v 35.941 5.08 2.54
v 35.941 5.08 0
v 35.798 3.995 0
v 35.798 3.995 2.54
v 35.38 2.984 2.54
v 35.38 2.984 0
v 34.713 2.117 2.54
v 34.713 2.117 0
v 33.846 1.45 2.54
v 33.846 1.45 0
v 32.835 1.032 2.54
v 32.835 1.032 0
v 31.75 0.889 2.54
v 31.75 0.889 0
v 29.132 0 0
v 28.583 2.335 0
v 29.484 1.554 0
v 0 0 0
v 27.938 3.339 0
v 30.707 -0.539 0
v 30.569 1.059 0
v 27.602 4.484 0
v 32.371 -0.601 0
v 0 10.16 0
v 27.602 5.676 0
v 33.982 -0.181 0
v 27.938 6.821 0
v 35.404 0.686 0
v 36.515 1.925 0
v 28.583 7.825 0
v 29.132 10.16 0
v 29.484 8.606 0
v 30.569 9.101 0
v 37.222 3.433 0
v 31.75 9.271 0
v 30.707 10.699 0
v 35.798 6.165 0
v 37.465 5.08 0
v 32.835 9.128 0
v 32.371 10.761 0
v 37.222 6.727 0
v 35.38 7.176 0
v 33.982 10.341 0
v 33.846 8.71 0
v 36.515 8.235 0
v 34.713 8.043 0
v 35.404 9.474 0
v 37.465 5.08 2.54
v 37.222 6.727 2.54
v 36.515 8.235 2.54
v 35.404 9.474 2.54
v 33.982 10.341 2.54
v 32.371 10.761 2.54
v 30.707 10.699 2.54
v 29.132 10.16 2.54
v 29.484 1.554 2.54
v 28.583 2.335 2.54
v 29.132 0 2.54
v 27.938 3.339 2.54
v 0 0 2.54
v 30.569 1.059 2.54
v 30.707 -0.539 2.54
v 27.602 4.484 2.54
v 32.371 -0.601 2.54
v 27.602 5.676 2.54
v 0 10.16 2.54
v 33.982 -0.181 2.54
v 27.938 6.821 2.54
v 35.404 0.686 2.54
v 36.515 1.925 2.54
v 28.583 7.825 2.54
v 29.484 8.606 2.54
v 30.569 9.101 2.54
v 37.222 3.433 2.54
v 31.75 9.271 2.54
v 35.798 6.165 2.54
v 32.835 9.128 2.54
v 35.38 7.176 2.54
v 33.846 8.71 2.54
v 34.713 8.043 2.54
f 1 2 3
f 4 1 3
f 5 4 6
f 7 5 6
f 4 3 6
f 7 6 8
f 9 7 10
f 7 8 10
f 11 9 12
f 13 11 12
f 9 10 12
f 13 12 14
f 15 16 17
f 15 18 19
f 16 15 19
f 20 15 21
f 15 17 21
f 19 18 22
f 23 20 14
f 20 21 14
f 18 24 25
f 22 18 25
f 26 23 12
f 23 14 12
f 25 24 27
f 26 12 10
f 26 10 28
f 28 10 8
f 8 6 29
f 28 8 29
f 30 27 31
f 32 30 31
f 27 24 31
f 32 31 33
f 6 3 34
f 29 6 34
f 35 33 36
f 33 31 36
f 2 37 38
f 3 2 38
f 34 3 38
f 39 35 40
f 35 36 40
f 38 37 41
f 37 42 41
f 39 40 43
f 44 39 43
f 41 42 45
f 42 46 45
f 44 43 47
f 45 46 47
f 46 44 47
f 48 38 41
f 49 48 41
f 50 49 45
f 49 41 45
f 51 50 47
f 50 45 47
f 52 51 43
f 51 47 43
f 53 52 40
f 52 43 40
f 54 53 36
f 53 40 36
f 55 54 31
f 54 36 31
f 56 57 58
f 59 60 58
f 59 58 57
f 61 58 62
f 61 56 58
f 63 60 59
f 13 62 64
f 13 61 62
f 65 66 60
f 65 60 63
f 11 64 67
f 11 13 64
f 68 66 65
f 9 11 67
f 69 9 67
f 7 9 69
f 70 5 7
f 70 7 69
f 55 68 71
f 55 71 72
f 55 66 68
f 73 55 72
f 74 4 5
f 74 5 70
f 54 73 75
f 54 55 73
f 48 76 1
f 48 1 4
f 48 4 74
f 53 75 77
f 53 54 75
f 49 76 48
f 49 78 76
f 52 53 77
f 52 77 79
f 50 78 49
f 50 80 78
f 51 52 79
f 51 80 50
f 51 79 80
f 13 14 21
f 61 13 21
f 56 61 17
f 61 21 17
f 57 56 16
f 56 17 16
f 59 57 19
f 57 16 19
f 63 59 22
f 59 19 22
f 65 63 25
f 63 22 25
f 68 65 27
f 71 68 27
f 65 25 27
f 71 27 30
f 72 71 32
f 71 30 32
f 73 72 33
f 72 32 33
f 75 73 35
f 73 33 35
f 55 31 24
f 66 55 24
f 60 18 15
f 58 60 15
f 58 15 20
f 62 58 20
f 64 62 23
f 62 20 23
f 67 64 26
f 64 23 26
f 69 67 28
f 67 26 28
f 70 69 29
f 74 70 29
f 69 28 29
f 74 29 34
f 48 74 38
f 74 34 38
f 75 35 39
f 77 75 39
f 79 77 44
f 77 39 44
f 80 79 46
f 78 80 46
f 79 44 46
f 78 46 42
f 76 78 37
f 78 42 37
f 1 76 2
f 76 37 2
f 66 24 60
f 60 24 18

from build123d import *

# Parameters (mm, degrees)
F1_DEPTH = 2.54


with BuildPart() as f1:
    # F0 (on Top) → F1 (new body)
    with BuildSketch(Plane.XY):
        with BuildLine():
            Line((0, 10.16), (0, 0))
            Line((0, 0), (29.1318279277, 0))
            ThreePointArc((29.1318279277, 0), (26.035, 5.08), (29.1318279277, 10.16))
            Line((29.1318279277, 10.16), (0, 10.16))
        make_face()
        with BuildLine():
            ThreePointArc((29.1318279277, 10.16), (26.035, 5.08), (29.1318279277, 0))
            Line((29.1318279277, 0), (31.75, 0))
            Line((31.75, 0), (31.75, 0.889))
            ThreePointArc((31.75, 0.889), (27.559, 5.08), (31.75, 9.271))
            Line((31.75, 9.271), (31.75, 10.16))
            Line((31.75, 10.16), (29.1318279277, 10.16))
        make_face()
        with BuildLine():
            Line((31.75, 0), (29.1318279277, 0))
            ThreePointArc((29.1318279277, 0), (34.7247581084, 0.2002418916), (37.465, 5.08))
            ThreePointArc((37.465, 5.08), (34.7247581084, 9.9597581084), (29.1318279277, 10.16))
            Line((29.1318279277, 10.16), (31.75, 10.16))
            Line((31.75, 10.16), (31.75, 9.271))
            ThreePointArc((31.75, 9.271), (34.71348452, 8.04348452), (35.941, 5.08))
            ThreePointArc((35.941, 5.08), (34.71348452, 2.11651548), (31.75, 0.889))
            Line((31.75, 0.889), (31.75, 0))
        make_face()
    extrude(amount=F1_DEPTH)


solid = f1.part
